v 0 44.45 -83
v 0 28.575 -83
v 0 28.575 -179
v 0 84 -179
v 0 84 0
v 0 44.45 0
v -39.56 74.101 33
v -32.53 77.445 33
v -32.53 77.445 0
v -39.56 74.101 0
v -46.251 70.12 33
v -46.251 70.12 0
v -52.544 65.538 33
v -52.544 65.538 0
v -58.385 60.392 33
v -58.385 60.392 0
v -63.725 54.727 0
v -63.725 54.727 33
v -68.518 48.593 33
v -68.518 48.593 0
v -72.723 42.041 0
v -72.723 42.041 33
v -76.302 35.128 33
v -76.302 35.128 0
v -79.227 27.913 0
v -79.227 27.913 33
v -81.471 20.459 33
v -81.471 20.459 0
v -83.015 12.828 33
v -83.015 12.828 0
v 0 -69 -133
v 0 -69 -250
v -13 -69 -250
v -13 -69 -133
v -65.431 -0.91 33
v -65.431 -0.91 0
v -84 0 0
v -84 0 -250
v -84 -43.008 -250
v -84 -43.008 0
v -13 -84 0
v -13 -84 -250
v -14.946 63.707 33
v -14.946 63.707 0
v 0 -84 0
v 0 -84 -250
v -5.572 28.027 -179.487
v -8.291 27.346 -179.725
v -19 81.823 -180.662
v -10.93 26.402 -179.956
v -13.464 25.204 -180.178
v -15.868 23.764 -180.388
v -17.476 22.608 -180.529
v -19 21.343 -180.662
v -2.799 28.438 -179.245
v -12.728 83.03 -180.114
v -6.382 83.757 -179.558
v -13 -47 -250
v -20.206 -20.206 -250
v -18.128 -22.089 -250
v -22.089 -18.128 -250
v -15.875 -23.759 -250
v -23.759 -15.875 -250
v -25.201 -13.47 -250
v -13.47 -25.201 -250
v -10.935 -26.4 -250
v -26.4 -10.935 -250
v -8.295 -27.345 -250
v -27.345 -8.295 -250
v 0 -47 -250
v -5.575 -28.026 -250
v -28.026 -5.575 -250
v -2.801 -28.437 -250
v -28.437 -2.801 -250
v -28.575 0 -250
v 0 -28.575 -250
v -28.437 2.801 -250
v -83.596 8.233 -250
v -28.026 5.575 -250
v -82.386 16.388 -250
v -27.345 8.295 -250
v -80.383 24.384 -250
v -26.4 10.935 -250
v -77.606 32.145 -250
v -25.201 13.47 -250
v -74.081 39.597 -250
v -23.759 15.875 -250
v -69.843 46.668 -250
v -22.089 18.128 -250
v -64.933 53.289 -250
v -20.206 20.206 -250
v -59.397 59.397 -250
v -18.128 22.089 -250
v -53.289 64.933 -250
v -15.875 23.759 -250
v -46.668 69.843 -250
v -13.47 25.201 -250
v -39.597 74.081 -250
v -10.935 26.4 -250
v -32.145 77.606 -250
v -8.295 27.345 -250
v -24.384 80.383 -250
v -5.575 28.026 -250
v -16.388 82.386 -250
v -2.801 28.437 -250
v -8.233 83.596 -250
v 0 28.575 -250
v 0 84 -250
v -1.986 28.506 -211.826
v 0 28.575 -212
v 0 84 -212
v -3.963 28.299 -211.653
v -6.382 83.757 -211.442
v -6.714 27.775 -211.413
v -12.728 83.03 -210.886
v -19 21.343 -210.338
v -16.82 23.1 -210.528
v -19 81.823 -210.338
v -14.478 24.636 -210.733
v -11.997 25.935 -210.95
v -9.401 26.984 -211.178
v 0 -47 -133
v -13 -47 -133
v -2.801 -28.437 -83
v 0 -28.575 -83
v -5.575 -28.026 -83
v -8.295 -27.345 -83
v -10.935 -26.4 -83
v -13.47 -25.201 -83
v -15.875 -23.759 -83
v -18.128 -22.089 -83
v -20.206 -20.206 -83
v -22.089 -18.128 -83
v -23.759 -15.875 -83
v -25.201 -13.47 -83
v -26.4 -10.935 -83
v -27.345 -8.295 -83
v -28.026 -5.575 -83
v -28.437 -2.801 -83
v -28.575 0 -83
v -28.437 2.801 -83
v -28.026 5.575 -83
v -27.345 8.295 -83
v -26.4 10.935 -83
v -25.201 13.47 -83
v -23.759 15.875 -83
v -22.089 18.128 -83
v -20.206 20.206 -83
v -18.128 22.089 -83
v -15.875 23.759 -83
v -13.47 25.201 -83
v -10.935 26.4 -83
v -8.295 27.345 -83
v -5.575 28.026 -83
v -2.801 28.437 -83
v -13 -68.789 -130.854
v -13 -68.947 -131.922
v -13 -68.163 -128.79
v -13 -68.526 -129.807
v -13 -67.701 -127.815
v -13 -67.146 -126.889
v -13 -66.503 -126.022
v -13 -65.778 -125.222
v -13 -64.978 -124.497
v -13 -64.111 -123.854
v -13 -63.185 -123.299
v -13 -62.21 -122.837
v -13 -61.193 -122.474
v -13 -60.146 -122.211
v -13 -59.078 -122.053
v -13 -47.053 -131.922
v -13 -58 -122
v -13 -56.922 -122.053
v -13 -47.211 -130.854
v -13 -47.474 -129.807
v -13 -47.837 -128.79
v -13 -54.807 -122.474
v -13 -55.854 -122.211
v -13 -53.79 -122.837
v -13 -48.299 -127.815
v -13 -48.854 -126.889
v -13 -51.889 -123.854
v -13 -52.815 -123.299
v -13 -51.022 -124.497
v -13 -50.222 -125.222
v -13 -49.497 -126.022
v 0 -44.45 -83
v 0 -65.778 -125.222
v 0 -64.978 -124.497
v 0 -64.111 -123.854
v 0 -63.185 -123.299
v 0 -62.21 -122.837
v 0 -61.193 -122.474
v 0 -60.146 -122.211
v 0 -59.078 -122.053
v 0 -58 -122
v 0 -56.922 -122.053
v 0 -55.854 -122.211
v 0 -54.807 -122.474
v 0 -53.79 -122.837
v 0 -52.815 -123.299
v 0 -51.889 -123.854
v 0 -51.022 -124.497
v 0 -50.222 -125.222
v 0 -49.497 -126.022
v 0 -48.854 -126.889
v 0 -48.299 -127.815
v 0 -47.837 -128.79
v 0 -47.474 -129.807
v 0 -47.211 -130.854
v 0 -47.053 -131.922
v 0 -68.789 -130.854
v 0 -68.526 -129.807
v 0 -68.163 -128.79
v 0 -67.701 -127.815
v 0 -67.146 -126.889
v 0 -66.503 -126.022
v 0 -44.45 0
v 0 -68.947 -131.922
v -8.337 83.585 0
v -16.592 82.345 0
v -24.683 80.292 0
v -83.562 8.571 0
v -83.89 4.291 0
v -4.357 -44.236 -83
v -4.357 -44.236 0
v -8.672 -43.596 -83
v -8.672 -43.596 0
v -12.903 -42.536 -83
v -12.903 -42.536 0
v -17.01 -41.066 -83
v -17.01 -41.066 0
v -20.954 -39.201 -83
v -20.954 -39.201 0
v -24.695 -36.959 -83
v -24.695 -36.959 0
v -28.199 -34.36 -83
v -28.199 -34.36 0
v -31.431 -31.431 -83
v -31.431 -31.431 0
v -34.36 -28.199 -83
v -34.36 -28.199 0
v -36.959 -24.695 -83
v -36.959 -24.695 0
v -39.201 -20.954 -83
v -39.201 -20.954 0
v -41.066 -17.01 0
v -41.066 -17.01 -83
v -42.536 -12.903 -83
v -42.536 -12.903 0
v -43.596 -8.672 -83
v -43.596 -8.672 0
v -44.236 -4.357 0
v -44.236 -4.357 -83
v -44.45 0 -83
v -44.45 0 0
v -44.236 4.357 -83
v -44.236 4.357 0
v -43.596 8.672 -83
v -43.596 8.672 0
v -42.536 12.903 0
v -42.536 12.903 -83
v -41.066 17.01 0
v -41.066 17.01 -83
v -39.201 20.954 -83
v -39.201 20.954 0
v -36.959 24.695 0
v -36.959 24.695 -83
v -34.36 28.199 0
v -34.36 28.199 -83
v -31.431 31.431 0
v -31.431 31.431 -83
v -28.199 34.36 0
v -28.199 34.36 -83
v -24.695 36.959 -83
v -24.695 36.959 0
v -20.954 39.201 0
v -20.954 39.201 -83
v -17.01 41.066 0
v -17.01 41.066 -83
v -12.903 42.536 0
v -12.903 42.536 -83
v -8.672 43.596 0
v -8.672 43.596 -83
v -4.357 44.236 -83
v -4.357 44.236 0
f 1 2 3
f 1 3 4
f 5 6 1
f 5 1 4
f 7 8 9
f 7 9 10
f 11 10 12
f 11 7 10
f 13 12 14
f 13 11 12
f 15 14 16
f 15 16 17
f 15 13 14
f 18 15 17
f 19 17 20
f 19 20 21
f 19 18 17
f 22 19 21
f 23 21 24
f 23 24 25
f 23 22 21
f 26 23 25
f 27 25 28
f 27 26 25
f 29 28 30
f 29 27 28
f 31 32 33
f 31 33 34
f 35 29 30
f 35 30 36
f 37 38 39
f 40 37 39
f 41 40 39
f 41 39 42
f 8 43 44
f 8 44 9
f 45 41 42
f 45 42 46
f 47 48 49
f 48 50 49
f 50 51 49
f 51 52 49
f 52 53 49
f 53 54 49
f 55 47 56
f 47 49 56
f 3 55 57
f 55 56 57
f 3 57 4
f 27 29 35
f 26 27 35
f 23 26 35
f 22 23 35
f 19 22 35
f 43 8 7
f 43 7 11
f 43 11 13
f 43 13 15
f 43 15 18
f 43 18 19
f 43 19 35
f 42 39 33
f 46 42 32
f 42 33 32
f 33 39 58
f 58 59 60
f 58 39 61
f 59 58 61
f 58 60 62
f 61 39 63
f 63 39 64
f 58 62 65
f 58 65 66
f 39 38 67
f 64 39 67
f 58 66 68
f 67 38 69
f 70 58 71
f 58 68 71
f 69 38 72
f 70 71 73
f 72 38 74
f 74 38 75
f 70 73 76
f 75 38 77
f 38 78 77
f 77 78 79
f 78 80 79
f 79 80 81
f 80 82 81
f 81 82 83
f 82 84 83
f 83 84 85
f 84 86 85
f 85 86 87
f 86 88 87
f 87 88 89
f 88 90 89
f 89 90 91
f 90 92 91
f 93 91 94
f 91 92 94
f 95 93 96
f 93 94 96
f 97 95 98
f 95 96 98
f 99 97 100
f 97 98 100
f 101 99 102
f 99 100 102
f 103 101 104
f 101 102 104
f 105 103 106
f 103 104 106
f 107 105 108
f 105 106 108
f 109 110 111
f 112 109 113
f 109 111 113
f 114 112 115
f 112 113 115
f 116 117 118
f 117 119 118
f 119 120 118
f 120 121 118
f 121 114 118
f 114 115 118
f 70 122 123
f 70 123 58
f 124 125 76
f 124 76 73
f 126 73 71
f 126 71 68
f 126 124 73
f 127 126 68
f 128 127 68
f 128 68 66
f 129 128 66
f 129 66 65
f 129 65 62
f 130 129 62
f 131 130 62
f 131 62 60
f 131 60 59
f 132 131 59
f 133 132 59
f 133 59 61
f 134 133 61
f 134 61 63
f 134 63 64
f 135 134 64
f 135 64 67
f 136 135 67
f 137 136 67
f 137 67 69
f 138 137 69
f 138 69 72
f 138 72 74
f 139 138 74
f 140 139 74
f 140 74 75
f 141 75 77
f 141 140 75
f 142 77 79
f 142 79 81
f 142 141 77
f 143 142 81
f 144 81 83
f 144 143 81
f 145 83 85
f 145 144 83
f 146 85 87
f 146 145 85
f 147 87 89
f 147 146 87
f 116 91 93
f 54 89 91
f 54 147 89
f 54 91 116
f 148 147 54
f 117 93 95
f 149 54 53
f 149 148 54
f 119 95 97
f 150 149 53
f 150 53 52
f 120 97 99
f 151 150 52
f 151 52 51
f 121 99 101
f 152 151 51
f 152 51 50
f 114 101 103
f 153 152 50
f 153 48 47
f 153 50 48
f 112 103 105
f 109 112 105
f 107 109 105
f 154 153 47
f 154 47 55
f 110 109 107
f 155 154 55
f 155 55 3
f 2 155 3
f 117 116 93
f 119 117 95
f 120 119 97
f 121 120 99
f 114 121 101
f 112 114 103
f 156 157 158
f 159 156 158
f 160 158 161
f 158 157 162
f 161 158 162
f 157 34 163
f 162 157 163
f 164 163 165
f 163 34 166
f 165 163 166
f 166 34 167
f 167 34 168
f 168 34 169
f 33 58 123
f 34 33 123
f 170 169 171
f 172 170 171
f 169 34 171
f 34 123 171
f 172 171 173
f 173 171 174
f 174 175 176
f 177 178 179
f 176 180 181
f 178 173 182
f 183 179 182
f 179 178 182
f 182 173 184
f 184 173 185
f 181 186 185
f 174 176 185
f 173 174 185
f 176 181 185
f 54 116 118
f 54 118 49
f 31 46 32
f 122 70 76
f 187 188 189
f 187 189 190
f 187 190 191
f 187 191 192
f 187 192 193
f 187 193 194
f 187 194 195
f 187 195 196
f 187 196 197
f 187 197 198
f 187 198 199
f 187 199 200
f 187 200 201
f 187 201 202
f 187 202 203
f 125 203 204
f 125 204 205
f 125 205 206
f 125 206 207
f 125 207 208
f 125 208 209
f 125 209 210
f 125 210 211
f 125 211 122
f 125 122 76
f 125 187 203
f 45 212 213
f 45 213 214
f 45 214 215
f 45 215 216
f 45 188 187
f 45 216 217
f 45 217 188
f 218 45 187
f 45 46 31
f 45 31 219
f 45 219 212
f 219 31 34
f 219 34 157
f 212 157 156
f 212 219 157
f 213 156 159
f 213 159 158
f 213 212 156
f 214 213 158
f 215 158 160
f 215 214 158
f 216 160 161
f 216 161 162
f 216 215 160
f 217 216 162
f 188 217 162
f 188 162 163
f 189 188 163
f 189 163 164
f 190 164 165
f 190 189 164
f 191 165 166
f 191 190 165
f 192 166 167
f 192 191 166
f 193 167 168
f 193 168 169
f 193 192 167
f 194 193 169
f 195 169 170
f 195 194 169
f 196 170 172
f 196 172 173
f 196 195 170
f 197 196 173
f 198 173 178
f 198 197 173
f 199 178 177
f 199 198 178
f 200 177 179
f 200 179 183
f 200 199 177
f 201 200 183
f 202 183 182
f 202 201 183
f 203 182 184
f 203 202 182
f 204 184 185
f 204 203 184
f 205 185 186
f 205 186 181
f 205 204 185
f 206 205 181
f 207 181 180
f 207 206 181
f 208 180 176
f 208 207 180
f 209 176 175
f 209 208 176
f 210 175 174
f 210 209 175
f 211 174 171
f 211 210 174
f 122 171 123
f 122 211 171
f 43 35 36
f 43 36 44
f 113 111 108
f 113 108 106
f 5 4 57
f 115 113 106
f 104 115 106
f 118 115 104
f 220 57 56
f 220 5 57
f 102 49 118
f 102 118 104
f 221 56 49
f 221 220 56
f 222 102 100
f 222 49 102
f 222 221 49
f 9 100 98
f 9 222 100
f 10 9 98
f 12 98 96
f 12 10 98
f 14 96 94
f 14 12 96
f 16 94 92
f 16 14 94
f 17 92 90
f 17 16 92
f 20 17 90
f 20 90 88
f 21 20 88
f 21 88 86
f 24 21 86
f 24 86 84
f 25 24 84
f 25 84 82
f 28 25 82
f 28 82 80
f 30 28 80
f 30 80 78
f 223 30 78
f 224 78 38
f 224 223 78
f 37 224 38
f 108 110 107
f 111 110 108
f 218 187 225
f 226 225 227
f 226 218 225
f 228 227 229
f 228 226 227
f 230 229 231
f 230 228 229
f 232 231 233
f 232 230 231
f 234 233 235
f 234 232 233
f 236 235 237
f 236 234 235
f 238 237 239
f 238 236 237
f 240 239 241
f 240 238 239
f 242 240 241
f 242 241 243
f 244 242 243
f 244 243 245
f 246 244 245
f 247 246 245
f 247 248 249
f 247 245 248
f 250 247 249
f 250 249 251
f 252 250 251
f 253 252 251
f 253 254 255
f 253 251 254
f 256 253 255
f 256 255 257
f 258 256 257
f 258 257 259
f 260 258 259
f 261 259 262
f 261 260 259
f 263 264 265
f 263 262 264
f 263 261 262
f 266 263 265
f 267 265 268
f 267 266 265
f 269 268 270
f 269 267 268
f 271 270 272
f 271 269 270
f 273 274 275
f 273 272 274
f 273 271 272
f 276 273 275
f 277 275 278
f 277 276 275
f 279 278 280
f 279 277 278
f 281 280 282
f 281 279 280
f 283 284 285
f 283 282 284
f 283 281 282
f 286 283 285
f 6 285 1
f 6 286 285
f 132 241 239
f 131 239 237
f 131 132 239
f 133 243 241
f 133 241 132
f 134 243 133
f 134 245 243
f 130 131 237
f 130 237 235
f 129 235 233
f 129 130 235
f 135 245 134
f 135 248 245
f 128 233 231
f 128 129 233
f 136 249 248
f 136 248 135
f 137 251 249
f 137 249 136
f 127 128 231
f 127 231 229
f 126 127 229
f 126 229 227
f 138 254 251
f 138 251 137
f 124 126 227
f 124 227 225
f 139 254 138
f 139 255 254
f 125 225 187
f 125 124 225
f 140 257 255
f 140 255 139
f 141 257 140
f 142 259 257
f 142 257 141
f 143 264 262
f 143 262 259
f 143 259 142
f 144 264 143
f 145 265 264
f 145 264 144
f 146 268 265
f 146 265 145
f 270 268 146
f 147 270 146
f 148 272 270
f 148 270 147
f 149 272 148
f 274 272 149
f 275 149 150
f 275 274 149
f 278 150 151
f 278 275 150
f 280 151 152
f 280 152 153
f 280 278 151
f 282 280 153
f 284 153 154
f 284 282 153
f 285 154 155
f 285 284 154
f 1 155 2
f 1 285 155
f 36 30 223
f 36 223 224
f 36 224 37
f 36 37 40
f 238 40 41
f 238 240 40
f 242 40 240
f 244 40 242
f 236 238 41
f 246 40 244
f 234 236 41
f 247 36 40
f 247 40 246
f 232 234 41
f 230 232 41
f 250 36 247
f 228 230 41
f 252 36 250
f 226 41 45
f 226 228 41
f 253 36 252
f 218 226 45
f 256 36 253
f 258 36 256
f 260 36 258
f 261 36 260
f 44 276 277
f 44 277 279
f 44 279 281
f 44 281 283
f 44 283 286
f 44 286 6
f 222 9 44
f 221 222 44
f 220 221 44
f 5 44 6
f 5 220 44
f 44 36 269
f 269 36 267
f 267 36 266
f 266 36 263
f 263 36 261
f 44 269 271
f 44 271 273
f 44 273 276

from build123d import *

# Parameters (mm, degrees)
BOSS_EXTRUDE1_DEPTH     = 250
BOSS_EXTRUDE2_START     = -167
BOSS_EXTRUDE2_DEPTH     = 167
CUT_EXTRUDE1_REACH      = 314.698
CUT_EXTRUDE1_END_RADIUS = 28.575
BOSS_EXTRUDE3_START     = 33
BOSS_EXTRUDE3_DEPTH     = 33
CUT_EXTRUDE2_DEPTH      = 13


with BuildPart() as part:
    # Sketch1 → Boss-Extrude1 (new body)
    with BuildSketch(Plane.XY):
        with BuildLine():
            Line((-84, 0), (-84, -43.008130888))
            Line((-84, -43.008130888), (-13, -84))
            Line((-13, -84), (0, -84))
            Line((0, -84), (0, -44.45))
            ThreePointArc((0, -44.45), (-44.45, 0), (0, 44.45))
            Line((0, 44.45), (0, 84))
            ThreePointArc((0, 84), (-59.39696962, 59.39696962), (-84, 0))
        make_face()
    extrude(amount=-BOSS_EXTRUDE1_DEPTH)

    # Sketch2 → Boss-Extrude2 (add)
    with BuildSketch(Plane(origin=(0, 0, -250), x_dir=(-1, 0, 0), z_dir=(0, 0, -1)).offset(BOSS_EXTRUDE2_START)):
        with BuildLine():
            Line((0, 28.575), (0, 44.45))
            ThreePointArc((0, 44.45), (44.45, 0), (0, -44.45))
            Line((0, -44.45), (0, -28.575))
            ThreePointArc((0, -28.575), (28.575, 0), (0, 28.575))
        make_face()
    extrude(amount=BOSS_EXTRUDE2_DEPTH)

    # Cut-Extrude1: up to this cylinder (the profile starts outside it)
    cut_extrude1_end = Plane(origin=(0, 0, -195.5), z_dir=(0, 0, -1)) * Cylinder(CUT_EXTRUDE1_END_RADIUS, 687.546, mode=Mode.PRIVATE)
    # Sketch3 → Cut-Extrude1 (cut, up to the surface)
    with BuildSketch(Plane(origin=(0, 84, 0), x_dir=(1, 0, 0), z_dir=(0, 1, 0)), mode=Mode.PRIVATE) as cut_extrude1_sk1:
        Polygon((0, 179), (0, 212), (-19, 210.337715393), (-19, 180.662284607), align=None)
    cut_extrude1_tool1 = extrude(cut_extrude1_sk1.sketch, amount=-CUT_EXTRUDE1_REACH, mode=Mode.PRIVATE) - cut_extrude1_end
    add(cut_extrude1_tool1.solids().sort_by_distance((-9.332027, 84, -195.5))[0], mode=Mode.SUBTRACT)

    # Sketch4 → Boss-Extrude3 (add)
    with BuildSketch(Plane.XY.offset(BOSS_EXTRUDE3_START)):
        with BuildLine():
            Line((-83.014649379, 12.828405531), (-65.430668922, -0.909705656))
            Line((-65.430668922, -0.909705656), (-14.946427946, 63.707176139))
            Line((-14.946427946, 63.707176139), (-32.530408402, 77.445287327))
            ThreePointArc((-32.530408402, 77.445287327), (-66.192903303, 51.715563927), (-83.014649379, 12.828405531))
        make_face()
    extrude(amount=-BOSS_EXTRUDE3_DEPTH)

    # Sketch5 → Cut-Extrude2 (cut)
    with BuildSketch(Plane(origin=(0, 0, 0), x_dir=(0, 0, -1), z_dir=(1, 0, 0))):
        with BuildLine():
            Line((250, -69), (133, -69))
            ThreePointArc((133, -69), (122, -58), (133, -47))
            Line((133, -47), (250, -47))
            ThreePointArc((250, -47), (261, -58), (250, -69))
        make_face()
    extrude(amount=-CUT_EXTRUDE2_DEPTH, mode=Mode.SUBTRACT)


solid = part.part
